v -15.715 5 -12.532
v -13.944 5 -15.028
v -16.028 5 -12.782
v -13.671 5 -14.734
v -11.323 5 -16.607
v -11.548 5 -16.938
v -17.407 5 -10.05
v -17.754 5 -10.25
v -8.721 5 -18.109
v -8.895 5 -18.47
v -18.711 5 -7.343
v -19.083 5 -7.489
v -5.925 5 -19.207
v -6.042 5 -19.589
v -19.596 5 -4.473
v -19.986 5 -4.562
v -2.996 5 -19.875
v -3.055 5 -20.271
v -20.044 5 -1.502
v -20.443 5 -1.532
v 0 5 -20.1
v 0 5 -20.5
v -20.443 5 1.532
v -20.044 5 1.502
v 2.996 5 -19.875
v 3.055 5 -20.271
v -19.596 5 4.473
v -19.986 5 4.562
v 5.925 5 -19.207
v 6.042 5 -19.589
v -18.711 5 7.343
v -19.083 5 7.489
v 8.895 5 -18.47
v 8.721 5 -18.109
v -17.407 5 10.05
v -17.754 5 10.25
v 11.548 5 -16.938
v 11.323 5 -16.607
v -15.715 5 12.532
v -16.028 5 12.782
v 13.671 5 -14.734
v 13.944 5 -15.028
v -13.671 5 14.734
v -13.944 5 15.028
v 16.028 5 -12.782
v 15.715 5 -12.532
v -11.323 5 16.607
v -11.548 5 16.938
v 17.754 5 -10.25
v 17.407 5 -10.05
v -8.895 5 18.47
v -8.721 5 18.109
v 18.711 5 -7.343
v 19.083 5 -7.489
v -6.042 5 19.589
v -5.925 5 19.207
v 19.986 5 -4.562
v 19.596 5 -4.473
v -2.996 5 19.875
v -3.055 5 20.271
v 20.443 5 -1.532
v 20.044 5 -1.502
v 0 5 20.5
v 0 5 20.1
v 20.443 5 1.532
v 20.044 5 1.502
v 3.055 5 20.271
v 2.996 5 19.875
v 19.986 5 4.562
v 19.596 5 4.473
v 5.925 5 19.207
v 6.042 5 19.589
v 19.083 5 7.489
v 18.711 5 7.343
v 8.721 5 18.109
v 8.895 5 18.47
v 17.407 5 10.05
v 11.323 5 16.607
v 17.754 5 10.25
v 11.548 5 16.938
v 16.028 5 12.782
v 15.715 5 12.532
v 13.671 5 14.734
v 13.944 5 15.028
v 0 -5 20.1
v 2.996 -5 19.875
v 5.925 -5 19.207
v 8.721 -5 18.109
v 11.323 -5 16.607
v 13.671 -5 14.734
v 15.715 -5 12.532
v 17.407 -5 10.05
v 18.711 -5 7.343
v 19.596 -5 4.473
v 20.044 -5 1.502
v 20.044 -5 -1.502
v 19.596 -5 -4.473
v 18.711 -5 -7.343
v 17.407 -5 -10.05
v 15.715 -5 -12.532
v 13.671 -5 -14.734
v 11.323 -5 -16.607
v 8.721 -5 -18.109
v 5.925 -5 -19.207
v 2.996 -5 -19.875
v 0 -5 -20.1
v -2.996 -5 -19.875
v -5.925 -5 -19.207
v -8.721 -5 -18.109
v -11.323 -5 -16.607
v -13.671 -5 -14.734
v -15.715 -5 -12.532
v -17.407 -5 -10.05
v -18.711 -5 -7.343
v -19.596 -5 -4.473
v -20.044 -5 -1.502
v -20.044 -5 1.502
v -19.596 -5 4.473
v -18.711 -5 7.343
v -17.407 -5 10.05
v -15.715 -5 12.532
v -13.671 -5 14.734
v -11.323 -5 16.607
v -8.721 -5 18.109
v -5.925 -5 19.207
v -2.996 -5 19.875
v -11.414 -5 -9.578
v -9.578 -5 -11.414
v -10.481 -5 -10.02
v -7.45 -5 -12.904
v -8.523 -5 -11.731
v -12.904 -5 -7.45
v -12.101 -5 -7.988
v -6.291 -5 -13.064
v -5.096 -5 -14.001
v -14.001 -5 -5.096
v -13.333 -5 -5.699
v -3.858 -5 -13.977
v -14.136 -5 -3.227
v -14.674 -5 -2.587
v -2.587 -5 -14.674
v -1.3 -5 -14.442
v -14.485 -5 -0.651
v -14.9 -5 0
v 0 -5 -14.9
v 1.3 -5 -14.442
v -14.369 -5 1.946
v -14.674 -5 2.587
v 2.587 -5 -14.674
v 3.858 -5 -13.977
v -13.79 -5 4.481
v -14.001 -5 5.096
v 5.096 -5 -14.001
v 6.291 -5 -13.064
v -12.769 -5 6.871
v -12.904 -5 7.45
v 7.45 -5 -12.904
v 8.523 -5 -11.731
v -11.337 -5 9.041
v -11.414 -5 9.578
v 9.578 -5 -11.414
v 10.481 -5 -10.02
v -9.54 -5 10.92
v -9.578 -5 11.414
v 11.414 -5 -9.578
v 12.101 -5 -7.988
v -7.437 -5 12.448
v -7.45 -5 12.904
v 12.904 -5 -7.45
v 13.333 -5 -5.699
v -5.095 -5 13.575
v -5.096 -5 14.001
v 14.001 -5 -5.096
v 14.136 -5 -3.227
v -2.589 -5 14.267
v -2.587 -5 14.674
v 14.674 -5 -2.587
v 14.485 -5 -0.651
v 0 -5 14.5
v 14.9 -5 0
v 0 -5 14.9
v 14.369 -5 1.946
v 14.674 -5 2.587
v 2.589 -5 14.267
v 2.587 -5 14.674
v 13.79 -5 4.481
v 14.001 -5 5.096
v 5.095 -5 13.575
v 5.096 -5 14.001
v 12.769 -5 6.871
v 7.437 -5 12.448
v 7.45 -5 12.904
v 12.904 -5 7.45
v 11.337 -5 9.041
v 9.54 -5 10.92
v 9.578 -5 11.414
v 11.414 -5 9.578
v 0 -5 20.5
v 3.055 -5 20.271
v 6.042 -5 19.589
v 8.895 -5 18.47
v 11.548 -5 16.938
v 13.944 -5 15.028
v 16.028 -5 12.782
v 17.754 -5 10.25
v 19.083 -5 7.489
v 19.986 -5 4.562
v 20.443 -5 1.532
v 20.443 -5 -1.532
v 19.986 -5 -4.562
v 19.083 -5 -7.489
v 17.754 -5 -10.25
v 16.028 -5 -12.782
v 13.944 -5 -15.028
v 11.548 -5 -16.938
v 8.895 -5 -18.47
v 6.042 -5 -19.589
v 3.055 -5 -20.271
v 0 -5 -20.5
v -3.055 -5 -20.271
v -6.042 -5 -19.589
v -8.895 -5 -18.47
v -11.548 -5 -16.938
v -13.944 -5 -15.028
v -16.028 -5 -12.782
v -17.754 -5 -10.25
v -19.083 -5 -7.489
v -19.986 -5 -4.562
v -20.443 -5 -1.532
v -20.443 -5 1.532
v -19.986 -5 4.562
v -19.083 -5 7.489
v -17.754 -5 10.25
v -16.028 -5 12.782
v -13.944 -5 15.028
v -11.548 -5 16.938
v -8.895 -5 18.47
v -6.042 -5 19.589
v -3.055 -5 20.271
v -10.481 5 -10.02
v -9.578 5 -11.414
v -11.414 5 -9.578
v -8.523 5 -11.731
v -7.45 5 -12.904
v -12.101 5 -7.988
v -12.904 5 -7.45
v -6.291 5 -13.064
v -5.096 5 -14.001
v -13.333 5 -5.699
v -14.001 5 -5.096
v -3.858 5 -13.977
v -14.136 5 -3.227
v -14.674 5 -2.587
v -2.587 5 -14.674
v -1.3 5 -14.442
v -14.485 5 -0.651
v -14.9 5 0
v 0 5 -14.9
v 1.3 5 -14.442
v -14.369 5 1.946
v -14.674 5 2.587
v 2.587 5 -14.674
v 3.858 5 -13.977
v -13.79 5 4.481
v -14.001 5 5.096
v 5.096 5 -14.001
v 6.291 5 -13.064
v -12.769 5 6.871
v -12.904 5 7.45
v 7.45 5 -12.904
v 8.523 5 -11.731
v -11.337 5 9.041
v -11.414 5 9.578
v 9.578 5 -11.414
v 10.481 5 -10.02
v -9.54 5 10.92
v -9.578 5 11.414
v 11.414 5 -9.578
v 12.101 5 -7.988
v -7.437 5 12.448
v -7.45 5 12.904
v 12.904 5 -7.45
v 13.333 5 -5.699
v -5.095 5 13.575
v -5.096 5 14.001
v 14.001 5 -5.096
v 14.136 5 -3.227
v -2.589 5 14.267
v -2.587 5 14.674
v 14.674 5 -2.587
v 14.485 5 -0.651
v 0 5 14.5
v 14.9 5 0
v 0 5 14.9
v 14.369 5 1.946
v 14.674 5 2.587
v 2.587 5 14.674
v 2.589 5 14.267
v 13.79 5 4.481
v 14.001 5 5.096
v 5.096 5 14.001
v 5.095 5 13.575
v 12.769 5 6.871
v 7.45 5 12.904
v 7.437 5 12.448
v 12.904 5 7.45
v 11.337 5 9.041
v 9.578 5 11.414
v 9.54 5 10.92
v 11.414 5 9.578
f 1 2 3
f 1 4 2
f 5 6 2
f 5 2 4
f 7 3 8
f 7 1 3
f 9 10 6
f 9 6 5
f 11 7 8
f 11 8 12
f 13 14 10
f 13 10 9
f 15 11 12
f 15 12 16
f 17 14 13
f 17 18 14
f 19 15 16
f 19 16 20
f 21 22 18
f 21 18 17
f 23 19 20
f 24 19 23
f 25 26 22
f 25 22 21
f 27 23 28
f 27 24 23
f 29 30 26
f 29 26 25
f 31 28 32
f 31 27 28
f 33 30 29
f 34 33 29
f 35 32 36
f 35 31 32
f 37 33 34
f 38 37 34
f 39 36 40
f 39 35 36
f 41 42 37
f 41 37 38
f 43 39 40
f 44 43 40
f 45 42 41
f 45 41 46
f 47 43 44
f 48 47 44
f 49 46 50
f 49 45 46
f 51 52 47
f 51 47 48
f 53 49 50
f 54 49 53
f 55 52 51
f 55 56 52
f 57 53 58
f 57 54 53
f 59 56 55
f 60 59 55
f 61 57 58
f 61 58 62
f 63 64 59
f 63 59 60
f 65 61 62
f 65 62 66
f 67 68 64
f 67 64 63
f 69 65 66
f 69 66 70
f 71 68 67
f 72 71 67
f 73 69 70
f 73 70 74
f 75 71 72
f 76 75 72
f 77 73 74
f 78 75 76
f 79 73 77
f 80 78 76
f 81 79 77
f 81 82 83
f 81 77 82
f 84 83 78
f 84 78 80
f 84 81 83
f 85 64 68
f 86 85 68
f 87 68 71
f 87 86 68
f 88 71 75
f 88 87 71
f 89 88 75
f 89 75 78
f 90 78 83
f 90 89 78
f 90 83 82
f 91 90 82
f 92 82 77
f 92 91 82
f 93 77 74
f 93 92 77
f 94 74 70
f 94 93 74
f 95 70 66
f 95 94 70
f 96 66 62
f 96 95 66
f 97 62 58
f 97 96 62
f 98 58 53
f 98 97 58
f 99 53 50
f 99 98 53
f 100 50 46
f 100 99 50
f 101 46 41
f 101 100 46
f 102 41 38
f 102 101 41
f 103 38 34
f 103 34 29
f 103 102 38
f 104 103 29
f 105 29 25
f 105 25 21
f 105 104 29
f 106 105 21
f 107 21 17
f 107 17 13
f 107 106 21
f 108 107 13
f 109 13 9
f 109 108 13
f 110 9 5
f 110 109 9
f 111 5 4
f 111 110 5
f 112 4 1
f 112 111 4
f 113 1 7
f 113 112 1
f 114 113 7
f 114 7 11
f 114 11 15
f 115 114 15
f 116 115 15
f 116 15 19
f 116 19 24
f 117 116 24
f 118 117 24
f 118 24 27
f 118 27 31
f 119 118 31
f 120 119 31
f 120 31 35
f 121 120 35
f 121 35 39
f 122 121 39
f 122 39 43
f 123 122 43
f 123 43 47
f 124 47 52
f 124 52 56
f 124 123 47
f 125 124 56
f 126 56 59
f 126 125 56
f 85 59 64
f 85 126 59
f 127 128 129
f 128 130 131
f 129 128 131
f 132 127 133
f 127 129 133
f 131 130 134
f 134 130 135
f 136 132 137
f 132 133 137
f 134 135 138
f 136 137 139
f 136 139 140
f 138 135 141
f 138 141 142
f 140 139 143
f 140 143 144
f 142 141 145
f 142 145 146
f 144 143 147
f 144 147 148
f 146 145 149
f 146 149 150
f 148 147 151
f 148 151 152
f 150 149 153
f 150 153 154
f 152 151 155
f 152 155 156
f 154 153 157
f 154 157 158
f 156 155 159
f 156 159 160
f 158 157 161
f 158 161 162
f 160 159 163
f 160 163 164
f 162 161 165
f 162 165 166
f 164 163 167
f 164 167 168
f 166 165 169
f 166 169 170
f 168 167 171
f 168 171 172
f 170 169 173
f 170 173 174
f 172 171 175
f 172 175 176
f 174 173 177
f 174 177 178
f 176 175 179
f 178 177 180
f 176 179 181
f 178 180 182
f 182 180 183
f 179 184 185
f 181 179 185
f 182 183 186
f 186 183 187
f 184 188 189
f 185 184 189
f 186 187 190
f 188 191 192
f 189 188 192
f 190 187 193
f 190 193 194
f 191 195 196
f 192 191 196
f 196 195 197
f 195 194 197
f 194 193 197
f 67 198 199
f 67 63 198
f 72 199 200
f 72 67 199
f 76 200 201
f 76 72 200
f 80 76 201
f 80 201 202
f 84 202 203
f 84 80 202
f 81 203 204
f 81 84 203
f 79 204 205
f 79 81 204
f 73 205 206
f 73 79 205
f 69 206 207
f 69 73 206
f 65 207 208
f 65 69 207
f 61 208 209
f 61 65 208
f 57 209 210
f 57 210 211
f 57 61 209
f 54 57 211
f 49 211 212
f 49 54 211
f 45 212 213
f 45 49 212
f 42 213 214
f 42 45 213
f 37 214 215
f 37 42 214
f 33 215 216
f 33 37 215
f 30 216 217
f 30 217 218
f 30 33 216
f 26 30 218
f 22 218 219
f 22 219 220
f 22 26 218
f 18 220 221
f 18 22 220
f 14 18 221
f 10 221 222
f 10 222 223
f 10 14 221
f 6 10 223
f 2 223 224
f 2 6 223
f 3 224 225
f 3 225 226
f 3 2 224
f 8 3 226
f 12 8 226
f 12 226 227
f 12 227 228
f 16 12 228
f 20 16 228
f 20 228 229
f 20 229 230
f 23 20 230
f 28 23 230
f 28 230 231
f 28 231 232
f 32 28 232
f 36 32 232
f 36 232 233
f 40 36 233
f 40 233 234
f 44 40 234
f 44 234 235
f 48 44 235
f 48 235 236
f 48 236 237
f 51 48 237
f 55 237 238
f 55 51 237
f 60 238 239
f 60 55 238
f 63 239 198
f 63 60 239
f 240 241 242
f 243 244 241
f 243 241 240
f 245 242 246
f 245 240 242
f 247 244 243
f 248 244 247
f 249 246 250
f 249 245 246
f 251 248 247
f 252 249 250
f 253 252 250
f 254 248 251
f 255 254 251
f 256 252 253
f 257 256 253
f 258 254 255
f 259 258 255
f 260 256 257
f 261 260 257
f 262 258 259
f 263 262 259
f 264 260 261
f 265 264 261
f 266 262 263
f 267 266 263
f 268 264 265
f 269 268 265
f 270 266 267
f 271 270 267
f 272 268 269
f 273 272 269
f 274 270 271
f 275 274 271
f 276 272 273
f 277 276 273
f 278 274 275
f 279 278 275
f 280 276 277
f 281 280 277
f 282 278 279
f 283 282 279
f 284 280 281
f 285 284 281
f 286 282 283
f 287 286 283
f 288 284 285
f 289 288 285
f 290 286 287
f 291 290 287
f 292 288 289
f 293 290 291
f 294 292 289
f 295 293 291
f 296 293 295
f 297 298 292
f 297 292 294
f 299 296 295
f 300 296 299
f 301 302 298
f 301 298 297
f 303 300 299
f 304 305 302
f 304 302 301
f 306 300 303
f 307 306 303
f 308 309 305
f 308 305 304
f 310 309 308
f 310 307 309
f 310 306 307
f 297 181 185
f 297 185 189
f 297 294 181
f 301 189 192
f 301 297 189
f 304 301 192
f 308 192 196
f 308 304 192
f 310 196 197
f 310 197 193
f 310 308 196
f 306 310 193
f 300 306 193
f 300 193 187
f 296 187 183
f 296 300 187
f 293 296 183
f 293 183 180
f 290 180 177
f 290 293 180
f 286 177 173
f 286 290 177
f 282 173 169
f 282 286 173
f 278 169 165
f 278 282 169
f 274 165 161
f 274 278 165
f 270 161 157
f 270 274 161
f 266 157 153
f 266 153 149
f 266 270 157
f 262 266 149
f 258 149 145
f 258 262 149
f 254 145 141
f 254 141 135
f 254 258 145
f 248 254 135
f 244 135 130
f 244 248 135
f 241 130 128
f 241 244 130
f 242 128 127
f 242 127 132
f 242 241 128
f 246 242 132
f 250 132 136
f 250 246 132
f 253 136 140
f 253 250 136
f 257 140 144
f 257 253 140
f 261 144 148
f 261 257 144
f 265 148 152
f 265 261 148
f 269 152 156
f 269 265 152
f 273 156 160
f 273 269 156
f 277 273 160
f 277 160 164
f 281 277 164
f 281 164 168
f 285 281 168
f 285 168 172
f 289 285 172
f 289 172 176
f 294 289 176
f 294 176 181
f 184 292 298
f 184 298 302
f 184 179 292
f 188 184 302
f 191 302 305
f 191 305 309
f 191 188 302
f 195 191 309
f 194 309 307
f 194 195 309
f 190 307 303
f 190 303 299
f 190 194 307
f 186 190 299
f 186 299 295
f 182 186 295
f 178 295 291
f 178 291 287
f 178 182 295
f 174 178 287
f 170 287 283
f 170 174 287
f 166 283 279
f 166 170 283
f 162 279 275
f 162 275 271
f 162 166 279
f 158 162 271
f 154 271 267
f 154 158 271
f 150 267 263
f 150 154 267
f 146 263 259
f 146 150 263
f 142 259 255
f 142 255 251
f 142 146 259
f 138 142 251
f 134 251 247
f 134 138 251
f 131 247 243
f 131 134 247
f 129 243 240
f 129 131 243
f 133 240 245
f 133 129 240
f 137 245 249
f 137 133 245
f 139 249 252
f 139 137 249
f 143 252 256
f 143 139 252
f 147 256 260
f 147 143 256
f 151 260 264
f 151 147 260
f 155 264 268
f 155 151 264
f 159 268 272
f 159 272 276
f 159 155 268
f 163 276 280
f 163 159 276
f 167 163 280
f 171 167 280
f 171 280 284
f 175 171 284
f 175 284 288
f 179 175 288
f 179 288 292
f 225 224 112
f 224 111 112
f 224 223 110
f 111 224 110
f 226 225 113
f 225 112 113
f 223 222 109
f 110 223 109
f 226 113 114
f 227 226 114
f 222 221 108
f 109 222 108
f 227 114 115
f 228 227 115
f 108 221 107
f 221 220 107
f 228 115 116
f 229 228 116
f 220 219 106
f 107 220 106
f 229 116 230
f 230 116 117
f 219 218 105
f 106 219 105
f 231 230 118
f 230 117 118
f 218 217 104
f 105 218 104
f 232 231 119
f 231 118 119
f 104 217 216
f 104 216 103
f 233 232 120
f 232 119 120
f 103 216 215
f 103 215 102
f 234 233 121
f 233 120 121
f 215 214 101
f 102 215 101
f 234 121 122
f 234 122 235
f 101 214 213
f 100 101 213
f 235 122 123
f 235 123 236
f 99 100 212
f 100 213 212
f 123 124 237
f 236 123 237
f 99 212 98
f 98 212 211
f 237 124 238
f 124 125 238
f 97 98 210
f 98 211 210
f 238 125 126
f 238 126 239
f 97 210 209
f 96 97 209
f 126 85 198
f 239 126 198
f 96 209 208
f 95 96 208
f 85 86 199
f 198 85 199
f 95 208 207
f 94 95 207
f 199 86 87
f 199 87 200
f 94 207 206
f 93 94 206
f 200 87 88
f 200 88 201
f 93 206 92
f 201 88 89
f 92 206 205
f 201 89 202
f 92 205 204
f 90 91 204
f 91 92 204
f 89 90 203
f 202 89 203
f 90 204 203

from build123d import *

# Parameters (mm, degrees)
SKETCH1_R             = 20.5
SKETCH1_R_2           = 20.1
BOSS_EXTRUDE1_DEPTH   = 5
SKETCH1_R_3           = 14.9
SKETCH1_R_4           = 14.5
BOSS_EXTRUDE1_2_DEPTH = 5


with BuildPart() as part:
    # Sketch1 → Boss-Extrude1 (new, symmetric)
    with BuildSketch(Plane(origin=(0, 0, 0), x_dir=(1, 0, 0), z_dir=(0, 1, 0))):
        with Locations(Location((0, 0, 0), (0, 0, 270))):
            Circle(SKETCH1_R)
        with Locations(Location((0, 0, 0), (0, 0, 270))):
            Circle(SKETCH1_R_2, mode=Mode.SUBTRACT)
    extrude(amount=BOSS_EXTRUDE1_DEPTH, both=True)


with BuildPart() as body_2:
    # Sketch1 → Boss-Extrude1 2 (new, symmetric)
    with BuildSketch(Plane(origin=(0, 0, 0), x_dir=(1, 0, 0), z_dir=(0, 1, 0))):
        with Locations(Location((0, 0, 0), (0, 0, 270))):
            Circle(SKETCH1_R_3)
        with Locations(Location((0, 0, 0), (0, 0, 270))):
            Circle(SKETCH1_R_4, mode=Mode.SUBTRACT)
    extrude(amount=BOSS_EXTRUDE1_2_DEPTH, both=True)


solid = Compound([part.part, body_2.part])
